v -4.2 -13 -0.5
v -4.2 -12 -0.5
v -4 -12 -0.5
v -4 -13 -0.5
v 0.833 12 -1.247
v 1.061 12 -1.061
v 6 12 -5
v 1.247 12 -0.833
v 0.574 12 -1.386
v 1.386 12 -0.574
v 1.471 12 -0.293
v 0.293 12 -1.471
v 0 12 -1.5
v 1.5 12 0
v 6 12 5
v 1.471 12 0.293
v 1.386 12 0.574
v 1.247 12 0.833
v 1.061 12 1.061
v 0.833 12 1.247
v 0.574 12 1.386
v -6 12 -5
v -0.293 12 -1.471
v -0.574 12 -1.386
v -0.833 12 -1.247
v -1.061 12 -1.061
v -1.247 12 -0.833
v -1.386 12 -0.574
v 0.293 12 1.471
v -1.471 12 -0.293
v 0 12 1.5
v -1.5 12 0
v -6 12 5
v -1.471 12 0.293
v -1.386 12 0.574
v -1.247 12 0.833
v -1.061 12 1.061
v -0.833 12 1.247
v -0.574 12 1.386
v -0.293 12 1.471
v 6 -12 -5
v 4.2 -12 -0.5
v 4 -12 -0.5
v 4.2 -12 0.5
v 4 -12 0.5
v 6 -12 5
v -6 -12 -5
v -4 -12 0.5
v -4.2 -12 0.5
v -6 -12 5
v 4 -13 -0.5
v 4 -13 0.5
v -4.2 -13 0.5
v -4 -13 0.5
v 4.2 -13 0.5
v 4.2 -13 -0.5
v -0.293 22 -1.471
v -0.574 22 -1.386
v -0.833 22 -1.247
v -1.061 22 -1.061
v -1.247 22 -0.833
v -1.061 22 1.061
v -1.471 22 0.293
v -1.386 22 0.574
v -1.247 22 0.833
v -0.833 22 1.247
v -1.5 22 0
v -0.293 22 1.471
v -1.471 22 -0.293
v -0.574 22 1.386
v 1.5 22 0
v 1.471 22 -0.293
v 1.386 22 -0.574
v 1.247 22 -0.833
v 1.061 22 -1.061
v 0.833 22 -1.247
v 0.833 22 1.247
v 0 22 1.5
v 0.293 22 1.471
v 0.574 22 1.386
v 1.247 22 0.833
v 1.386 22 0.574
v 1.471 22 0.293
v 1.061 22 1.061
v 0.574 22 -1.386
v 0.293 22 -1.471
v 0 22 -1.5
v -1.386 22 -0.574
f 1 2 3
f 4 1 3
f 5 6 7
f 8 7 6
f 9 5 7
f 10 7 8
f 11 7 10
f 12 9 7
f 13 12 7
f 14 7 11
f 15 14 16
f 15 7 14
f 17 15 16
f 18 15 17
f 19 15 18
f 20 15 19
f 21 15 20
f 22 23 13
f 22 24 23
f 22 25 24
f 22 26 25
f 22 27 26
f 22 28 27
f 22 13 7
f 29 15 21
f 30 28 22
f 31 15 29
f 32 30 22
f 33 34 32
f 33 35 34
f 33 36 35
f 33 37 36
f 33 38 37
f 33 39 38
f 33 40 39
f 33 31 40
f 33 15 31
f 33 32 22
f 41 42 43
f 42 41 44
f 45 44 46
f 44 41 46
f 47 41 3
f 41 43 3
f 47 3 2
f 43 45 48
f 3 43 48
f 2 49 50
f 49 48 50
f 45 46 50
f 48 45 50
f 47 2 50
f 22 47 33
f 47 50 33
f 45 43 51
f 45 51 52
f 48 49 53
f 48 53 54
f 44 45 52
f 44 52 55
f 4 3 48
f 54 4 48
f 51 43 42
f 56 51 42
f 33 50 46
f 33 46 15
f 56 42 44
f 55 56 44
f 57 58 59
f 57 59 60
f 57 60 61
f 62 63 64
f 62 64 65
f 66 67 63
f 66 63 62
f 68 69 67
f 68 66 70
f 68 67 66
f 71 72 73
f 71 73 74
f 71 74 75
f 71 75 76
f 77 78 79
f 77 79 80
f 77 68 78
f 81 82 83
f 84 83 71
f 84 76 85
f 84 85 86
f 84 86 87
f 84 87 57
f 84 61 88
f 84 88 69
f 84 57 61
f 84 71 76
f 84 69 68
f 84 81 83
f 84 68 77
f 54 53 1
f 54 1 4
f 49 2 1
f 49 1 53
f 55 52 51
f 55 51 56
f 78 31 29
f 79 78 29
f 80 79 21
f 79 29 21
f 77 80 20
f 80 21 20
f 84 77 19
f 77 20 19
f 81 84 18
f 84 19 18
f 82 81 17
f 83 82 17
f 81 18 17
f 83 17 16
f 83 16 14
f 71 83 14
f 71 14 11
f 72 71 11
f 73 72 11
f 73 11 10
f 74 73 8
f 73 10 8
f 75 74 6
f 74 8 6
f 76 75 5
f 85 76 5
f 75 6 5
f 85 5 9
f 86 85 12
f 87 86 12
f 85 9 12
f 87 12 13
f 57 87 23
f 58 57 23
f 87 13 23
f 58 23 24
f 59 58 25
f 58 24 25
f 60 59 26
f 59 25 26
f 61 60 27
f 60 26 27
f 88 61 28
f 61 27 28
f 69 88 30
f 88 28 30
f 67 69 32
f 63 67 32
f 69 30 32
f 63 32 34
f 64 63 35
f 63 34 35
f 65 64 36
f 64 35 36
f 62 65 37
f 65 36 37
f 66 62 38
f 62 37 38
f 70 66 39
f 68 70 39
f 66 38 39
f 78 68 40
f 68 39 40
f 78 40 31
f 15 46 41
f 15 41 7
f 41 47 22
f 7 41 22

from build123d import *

# Parameters (mm, degrees)
SKETCH1_W           = 24
SKETCH1_H           = 12
BOSS_EXTRUDE1_DEPTH = 5
SKETCH2_R           = 1.5
BOSS_EXTRUDE2_DEPTH = 10
SKETCH3_W           = 0.2
SKETCH3_H           = 1
BOSS_EXTRUDE3_DEPTH = 1


with BuildPart() as part:
    # Sketch1 → Boss-Extrude1 (new, symmetric)
    with BuildSketch(Plane(origin=(0, 0, 0), x_dir=(0, 1, 0), z_dir=(0, 0, 1))):
        Rectangle(SKETCH1_W, SKETCH1_H)
    extrude(amount=BOSS_EXTRUDE1_DEPTH, both=True)

    # Sketch2 → Boss-Extrude2 (add)
    with BuildSketch(Plane(origin=(0, 12, 0), x_dir=(-1, 0, 0), z_dir=(0, 1, 0))):
        with Locations(Location((0, 0, 0), (0, 0, 90))):
            Circle(SKETCH2_R)
    extrude(amount=BOSS_EXTRUDE2_DEPTH)

    # Sketch3 → Boss-Extrude3 (add)
    with BuildSketch(Plane.XZ.offset(12)):
        with Locations((4.1, 0)):
            Rectangle(SKETCH3_W, SKETCH3_H)
        with Locations((-4.1, 0)):
            Rectangle(SKETCH3_W, SKETCH3_H)
    extrude(amount=BOSS_EXTRUDE3_DEPTH)


solid = part.part
